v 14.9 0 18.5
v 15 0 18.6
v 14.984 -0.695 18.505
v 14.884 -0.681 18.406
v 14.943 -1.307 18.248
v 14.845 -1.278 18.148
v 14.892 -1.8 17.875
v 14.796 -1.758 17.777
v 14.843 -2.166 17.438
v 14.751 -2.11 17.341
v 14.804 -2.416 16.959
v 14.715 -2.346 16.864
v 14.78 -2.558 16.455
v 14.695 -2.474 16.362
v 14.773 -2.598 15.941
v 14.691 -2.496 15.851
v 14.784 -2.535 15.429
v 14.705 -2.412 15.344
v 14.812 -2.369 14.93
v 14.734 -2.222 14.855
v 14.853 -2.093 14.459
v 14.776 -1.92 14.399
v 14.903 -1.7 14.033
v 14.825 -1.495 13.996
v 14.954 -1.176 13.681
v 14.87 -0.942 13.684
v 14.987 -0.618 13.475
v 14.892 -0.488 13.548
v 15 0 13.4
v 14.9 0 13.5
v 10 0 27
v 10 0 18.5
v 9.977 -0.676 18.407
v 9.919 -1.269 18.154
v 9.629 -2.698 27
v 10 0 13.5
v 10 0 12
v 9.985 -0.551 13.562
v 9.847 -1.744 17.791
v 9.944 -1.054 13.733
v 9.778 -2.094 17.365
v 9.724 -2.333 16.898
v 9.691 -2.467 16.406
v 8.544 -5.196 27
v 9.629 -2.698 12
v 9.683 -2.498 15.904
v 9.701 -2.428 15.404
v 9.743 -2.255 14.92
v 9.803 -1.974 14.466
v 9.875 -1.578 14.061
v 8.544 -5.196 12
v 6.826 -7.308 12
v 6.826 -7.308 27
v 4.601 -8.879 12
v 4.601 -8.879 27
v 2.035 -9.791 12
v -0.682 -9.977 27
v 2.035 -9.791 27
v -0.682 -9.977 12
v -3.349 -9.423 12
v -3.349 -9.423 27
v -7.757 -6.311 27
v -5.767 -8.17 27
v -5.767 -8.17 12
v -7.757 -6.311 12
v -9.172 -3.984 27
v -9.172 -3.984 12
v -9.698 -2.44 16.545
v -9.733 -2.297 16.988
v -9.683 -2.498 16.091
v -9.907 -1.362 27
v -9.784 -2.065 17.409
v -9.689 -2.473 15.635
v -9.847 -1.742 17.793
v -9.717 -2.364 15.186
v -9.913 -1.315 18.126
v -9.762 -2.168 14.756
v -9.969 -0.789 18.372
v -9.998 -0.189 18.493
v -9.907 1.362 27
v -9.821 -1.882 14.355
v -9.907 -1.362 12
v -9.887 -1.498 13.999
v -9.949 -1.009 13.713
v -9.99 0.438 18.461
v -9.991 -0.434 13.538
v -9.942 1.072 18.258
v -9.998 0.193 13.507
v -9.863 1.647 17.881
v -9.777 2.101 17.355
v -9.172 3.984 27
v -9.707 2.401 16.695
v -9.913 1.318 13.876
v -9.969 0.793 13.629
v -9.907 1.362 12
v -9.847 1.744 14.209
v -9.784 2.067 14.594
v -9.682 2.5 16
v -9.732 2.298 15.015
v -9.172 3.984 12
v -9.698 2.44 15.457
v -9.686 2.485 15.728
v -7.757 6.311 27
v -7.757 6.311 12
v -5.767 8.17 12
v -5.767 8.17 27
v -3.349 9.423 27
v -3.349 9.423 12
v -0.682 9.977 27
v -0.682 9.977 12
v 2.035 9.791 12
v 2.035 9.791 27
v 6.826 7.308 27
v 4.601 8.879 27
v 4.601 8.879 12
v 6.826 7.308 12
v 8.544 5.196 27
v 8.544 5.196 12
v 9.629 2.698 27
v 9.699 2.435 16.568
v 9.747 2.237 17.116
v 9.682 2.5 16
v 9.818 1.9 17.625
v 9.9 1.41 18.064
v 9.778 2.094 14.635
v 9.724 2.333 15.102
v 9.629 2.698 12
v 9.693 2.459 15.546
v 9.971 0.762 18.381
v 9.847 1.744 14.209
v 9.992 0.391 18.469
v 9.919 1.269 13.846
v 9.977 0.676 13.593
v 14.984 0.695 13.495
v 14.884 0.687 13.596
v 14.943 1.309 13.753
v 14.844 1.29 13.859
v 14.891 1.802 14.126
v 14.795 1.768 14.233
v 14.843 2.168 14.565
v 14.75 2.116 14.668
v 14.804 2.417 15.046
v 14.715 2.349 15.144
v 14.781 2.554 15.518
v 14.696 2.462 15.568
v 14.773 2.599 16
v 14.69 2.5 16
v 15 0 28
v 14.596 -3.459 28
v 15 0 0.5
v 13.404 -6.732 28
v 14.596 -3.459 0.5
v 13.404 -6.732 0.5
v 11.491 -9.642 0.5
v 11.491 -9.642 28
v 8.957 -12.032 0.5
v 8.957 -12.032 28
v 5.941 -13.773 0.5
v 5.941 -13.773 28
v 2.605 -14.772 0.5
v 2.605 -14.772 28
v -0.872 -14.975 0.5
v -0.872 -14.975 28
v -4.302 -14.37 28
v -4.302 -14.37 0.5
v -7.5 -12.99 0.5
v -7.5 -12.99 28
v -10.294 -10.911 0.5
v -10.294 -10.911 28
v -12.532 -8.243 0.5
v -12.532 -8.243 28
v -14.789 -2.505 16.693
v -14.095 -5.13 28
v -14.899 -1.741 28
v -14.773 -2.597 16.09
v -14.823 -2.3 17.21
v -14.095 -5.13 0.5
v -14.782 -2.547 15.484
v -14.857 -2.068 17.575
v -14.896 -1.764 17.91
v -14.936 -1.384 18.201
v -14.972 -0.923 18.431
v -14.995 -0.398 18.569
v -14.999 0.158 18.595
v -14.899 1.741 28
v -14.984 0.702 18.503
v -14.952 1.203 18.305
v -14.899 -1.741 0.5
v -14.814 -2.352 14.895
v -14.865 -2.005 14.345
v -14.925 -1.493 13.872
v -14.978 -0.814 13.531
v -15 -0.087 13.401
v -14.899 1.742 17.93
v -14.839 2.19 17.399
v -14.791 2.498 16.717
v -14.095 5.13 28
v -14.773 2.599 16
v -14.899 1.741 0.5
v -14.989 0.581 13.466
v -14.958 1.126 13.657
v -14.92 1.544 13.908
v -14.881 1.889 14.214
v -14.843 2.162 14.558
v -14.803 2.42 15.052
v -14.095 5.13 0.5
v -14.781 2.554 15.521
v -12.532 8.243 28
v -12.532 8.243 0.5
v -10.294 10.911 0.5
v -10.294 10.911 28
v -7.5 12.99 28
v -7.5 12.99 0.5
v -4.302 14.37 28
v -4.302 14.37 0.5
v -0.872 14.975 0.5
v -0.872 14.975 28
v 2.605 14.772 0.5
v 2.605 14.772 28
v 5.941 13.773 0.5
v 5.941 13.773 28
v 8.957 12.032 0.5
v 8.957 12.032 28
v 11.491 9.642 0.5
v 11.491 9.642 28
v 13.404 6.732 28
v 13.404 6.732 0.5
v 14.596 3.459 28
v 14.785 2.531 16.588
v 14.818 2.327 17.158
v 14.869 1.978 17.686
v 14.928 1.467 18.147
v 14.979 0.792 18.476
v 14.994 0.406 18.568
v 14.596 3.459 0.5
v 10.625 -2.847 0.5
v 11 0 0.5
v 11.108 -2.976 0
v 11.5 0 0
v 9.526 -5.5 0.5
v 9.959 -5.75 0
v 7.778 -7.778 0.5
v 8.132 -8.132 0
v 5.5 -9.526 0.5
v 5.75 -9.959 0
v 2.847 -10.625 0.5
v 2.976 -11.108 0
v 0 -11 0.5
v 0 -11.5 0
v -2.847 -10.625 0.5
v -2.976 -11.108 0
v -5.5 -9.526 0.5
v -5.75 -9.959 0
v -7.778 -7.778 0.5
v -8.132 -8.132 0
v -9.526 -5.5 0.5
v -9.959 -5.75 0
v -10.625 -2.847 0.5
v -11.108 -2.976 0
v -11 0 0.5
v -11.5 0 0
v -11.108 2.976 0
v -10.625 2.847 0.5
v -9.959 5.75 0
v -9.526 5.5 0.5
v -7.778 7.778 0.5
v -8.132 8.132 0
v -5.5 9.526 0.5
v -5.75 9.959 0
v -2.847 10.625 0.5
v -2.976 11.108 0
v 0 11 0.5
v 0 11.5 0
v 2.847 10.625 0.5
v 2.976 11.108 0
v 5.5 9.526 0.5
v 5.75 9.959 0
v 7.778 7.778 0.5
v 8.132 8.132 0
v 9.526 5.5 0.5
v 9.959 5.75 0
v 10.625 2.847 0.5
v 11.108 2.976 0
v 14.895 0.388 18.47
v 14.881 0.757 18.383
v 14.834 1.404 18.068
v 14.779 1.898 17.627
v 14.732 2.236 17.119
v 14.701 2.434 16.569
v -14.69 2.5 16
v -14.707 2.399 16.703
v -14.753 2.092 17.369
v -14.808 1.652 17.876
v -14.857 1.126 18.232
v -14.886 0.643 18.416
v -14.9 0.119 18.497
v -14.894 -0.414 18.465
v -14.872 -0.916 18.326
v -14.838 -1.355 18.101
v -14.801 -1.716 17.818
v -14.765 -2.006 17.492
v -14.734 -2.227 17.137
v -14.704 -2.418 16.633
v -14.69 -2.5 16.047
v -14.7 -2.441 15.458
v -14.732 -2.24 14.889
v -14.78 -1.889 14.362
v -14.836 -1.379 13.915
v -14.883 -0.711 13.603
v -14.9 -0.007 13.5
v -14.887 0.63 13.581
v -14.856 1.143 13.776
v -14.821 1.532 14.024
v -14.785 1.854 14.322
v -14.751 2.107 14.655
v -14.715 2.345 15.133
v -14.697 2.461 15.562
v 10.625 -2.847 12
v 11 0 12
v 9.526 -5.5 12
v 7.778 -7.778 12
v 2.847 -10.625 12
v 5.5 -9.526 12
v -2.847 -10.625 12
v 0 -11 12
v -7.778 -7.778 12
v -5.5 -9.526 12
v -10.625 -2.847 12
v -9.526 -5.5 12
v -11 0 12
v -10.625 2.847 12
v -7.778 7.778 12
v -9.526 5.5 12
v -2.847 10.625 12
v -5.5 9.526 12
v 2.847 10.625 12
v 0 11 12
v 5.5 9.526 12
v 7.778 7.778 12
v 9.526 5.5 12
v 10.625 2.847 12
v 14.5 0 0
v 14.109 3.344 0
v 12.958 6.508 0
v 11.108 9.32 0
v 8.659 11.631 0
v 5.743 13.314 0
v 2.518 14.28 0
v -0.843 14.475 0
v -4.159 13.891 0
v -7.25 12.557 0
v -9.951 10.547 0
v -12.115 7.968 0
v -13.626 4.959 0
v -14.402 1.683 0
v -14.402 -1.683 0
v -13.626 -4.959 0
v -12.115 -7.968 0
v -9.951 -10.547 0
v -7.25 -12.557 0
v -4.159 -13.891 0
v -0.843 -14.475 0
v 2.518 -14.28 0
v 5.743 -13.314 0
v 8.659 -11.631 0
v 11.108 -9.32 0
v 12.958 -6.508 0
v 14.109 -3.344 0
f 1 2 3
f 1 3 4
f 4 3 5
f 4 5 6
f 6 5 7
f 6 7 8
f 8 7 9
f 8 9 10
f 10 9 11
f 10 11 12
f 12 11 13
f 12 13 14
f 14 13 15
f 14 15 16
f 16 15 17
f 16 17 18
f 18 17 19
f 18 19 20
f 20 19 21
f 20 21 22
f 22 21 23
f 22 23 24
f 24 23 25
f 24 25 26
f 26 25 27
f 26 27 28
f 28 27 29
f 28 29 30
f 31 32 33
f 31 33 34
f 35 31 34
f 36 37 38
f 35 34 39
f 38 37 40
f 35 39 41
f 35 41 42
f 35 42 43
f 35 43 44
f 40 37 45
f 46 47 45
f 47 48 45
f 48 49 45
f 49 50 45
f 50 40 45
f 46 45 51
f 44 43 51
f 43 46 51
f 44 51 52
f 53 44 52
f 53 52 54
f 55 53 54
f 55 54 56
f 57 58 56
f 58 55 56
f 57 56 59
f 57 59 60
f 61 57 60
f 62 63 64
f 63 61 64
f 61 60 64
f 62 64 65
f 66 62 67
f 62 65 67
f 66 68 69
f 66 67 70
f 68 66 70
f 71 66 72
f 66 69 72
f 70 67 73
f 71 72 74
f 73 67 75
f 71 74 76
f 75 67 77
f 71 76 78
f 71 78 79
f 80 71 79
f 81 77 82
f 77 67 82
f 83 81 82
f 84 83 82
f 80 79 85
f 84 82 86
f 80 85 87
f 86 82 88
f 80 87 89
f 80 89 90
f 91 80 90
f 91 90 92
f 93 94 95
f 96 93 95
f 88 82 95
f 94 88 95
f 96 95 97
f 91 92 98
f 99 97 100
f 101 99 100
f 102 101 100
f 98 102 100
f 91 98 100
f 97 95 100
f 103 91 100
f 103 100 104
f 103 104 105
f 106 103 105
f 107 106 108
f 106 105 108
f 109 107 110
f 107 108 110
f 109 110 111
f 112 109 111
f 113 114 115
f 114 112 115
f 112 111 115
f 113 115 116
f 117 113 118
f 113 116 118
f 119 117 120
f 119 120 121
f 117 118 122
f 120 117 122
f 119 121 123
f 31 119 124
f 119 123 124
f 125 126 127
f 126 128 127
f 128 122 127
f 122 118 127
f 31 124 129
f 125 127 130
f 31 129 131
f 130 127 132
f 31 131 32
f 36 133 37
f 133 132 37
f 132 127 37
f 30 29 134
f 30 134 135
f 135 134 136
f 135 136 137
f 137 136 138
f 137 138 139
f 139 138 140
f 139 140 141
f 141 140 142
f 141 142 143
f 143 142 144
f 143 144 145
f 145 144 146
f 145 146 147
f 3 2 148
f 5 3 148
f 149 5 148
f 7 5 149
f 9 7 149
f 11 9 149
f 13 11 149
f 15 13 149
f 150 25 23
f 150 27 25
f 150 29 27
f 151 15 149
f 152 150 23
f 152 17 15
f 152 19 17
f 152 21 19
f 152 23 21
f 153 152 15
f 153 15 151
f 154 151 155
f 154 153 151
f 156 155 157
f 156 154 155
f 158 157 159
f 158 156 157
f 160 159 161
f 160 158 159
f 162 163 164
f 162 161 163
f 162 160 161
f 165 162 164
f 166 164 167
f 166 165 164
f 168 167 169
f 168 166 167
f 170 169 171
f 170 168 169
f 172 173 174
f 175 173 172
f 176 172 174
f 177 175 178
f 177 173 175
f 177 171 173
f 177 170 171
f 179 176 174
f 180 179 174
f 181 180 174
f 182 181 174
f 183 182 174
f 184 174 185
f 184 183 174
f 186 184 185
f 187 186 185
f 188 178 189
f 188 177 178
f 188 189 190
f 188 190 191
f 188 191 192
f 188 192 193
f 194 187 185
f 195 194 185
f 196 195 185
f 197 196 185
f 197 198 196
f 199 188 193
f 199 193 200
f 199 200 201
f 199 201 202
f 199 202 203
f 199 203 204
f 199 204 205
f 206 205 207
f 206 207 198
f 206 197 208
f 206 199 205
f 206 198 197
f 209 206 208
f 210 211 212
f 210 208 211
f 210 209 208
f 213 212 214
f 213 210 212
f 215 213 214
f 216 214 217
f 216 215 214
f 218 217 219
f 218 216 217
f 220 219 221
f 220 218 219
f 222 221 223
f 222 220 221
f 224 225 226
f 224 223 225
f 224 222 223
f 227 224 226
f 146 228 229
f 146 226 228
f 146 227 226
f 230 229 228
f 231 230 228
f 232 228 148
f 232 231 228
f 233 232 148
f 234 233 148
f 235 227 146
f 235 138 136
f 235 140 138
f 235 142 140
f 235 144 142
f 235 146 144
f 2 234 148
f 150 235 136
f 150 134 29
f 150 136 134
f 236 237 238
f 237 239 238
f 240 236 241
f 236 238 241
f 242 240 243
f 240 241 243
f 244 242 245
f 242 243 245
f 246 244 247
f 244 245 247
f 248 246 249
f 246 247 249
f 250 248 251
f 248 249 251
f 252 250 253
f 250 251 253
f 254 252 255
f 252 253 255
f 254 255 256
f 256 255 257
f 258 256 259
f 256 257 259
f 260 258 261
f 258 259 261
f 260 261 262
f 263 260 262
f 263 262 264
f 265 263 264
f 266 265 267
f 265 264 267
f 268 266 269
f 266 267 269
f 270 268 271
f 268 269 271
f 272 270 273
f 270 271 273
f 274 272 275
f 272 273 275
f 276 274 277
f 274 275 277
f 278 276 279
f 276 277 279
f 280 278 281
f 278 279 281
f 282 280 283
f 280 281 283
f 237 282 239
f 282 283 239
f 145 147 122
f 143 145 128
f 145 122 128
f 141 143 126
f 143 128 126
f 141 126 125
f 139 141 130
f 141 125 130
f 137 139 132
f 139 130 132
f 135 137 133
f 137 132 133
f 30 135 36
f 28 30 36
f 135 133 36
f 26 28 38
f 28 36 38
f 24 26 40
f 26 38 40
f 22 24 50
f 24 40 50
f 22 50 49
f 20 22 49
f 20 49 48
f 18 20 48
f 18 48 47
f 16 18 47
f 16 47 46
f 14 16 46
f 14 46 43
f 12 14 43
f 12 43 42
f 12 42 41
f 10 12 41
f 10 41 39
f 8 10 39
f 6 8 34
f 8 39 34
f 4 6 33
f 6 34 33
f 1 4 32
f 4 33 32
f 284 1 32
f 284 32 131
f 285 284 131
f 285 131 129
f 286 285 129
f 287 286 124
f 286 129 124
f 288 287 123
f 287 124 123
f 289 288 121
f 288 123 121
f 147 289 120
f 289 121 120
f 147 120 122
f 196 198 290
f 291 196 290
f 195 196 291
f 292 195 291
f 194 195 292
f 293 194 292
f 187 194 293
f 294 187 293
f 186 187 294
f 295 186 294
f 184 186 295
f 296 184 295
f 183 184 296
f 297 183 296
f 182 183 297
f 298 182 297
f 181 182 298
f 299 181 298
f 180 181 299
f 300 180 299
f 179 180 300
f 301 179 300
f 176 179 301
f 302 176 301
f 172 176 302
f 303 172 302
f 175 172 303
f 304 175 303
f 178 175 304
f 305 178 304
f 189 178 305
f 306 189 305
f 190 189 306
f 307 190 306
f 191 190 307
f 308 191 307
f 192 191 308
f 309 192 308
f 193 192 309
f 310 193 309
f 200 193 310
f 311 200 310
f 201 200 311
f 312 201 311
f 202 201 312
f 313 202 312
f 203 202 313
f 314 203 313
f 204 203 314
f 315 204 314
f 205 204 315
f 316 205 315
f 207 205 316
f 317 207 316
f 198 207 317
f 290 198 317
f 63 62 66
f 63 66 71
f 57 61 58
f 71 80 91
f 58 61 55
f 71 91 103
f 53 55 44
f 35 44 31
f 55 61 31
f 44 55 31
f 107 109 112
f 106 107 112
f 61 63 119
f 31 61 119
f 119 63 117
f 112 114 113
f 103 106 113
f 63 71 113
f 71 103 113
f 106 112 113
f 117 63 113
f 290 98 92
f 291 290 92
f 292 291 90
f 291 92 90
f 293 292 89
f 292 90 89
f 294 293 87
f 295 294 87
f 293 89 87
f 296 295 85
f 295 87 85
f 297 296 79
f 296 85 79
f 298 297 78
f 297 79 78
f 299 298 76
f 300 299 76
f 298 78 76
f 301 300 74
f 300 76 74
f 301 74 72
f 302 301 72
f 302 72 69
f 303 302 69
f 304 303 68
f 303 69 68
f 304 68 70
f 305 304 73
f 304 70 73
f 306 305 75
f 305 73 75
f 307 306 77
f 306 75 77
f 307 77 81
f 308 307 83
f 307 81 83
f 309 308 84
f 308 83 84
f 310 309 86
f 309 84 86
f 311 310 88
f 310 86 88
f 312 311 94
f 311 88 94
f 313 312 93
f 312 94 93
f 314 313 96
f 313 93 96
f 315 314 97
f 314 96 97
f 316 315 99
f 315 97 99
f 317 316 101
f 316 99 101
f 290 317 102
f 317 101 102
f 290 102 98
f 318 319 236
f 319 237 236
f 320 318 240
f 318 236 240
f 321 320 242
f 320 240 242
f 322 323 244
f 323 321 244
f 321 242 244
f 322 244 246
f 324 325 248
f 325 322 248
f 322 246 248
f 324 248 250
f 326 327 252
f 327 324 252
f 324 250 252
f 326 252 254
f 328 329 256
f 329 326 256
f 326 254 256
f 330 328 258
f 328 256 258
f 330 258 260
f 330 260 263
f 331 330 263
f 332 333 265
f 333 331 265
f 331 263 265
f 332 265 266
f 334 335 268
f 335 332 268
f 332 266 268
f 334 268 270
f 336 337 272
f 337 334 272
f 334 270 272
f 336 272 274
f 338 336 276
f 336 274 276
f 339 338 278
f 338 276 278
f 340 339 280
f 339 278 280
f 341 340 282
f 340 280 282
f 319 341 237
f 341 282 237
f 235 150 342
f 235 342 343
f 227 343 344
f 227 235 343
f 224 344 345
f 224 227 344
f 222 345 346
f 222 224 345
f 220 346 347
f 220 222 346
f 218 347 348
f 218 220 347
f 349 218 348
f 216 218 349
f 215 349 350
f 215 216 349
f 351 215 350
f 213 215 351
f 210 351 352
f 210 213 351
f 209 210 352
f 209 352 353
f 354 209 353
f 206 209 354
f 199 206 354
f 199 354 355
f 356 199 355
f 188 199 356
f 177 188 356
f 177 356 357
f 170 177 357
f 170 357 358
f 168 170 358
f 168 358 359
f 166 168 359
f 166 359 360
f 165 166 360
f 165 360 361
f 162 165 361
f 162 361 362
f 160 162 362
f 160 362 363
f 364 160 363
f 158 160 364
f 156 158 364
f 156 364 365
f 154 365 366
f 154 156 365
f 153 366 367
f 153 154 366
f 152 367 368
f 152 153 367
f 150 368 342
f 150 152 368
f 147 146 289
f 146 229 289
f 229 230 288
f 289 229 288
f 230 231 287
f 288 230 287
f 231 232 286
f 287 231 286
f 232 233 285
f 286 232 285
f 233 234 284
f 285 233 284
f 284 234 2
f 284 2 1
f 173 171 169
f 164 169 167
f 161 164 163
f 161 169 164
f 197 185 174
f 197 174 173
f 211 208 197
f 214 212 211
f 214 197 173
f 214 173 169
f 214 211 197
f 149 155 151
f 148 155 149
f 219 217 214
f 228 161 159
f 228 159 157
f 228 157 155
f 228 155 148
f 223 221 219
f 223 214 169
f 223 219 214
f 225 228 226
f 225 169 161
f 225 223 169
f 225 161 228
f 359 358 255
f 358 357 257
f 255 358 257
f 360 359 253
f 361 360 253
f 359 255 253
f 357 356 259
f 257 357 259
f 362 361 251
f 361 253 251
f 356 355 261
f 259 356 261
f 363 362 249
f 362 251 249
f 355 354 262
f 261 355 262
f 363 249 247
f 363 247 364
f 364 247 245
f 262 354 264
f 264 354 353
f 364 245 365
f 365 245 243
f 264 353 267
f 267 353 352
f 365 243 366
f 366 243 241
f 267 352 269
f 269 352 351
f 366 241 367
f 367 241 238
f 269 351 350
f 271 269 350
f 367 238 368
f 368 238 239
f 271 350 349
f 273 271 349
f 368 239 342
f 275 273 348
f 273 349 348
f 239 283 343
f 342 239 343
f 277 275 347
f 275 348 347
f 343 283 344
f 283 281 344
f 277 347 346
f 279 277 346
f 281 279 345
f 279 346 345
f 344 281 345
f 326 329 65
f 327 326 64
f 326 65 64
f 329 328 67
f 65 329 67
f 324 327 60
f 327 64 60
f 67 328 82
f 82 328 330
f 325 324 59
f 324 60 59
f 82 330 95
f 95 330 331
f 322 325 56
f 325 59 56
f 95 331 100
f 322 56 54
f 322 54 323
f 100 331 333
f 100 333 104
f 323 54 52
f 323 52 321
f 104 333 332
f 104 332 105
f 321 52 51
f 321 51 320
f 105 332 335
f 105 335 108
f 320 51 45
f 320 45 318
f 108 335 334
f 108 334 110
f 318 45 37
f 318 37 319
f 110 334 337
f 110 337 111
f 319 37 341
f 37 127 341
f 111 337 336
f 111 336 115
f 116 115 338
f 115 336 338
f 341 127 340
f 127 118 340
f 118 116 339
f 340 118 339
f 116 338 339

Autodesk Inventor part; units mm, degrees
ref_plane "YZ Plane" through (0, 0, 0) normal (1, 0, 0) x (0, 1, 0)
ref_plane "XZ Plane" through (0, 0, 0) normal (0, 1, 0) x (-1, 0, 0)
ref_plane "XY Plane" through (0, 0, 0) normal (0, 0, 1) x (1, 0, 0)
sketch "Sketch1" plane through (0, 0, 0) normal (0, 0, 1) x (1, 0, 0)
  circle A0 centre (0, 0) radius 10
  circle A1 centre (0, 0) radius 11
  circle A2 centre (0, 0) radius 15
  dimension "d0" = 20
  dimension "d1" = 22
  dimension "d2" = 30
extrude "Extrusion1" add sketch "Sketch1" along normal blind 28 contours A0 | A1 | A2
extrude "Extrusion2" cut sketch "Sketch1" along normal blind 12 contours A1
extrude "Extrusion3" cut sketch "Sketch1" along normal blind 27 contours A0
sketch "Sketch2" plane through (0, 0, 0) normal (1, 0, 0) x (0, 1, 0)
  line L0 (15, 28) -> (-15, 28) projected
  line L1 (15, 0) -> (-15, 0) projected
  circle A0 centre (0, 16) radius 2.5
  point P0 (0, 0)
  point P1 (0, 0)
  dimension "d9" = 5
  dimension "d10" = 16
extrude "Extrusion4" cut sketch "Sketch2" along normal through all both and the other way through all
chamfer "Chamfer1" distance 0.5 angle 45 2 edges at (-11, 0, 0) (-15, 0, 0)
chamfer "Chamfer2" distance 0.1 angle 45 4 edges at (14.7902, -2.5, 16.0004) (14.8791, 1.901, 14.3764) (14.8788, 1.9027, 17.6217) (-14.7902, -2.4999, 15.9815)
properties part number "Piston"
